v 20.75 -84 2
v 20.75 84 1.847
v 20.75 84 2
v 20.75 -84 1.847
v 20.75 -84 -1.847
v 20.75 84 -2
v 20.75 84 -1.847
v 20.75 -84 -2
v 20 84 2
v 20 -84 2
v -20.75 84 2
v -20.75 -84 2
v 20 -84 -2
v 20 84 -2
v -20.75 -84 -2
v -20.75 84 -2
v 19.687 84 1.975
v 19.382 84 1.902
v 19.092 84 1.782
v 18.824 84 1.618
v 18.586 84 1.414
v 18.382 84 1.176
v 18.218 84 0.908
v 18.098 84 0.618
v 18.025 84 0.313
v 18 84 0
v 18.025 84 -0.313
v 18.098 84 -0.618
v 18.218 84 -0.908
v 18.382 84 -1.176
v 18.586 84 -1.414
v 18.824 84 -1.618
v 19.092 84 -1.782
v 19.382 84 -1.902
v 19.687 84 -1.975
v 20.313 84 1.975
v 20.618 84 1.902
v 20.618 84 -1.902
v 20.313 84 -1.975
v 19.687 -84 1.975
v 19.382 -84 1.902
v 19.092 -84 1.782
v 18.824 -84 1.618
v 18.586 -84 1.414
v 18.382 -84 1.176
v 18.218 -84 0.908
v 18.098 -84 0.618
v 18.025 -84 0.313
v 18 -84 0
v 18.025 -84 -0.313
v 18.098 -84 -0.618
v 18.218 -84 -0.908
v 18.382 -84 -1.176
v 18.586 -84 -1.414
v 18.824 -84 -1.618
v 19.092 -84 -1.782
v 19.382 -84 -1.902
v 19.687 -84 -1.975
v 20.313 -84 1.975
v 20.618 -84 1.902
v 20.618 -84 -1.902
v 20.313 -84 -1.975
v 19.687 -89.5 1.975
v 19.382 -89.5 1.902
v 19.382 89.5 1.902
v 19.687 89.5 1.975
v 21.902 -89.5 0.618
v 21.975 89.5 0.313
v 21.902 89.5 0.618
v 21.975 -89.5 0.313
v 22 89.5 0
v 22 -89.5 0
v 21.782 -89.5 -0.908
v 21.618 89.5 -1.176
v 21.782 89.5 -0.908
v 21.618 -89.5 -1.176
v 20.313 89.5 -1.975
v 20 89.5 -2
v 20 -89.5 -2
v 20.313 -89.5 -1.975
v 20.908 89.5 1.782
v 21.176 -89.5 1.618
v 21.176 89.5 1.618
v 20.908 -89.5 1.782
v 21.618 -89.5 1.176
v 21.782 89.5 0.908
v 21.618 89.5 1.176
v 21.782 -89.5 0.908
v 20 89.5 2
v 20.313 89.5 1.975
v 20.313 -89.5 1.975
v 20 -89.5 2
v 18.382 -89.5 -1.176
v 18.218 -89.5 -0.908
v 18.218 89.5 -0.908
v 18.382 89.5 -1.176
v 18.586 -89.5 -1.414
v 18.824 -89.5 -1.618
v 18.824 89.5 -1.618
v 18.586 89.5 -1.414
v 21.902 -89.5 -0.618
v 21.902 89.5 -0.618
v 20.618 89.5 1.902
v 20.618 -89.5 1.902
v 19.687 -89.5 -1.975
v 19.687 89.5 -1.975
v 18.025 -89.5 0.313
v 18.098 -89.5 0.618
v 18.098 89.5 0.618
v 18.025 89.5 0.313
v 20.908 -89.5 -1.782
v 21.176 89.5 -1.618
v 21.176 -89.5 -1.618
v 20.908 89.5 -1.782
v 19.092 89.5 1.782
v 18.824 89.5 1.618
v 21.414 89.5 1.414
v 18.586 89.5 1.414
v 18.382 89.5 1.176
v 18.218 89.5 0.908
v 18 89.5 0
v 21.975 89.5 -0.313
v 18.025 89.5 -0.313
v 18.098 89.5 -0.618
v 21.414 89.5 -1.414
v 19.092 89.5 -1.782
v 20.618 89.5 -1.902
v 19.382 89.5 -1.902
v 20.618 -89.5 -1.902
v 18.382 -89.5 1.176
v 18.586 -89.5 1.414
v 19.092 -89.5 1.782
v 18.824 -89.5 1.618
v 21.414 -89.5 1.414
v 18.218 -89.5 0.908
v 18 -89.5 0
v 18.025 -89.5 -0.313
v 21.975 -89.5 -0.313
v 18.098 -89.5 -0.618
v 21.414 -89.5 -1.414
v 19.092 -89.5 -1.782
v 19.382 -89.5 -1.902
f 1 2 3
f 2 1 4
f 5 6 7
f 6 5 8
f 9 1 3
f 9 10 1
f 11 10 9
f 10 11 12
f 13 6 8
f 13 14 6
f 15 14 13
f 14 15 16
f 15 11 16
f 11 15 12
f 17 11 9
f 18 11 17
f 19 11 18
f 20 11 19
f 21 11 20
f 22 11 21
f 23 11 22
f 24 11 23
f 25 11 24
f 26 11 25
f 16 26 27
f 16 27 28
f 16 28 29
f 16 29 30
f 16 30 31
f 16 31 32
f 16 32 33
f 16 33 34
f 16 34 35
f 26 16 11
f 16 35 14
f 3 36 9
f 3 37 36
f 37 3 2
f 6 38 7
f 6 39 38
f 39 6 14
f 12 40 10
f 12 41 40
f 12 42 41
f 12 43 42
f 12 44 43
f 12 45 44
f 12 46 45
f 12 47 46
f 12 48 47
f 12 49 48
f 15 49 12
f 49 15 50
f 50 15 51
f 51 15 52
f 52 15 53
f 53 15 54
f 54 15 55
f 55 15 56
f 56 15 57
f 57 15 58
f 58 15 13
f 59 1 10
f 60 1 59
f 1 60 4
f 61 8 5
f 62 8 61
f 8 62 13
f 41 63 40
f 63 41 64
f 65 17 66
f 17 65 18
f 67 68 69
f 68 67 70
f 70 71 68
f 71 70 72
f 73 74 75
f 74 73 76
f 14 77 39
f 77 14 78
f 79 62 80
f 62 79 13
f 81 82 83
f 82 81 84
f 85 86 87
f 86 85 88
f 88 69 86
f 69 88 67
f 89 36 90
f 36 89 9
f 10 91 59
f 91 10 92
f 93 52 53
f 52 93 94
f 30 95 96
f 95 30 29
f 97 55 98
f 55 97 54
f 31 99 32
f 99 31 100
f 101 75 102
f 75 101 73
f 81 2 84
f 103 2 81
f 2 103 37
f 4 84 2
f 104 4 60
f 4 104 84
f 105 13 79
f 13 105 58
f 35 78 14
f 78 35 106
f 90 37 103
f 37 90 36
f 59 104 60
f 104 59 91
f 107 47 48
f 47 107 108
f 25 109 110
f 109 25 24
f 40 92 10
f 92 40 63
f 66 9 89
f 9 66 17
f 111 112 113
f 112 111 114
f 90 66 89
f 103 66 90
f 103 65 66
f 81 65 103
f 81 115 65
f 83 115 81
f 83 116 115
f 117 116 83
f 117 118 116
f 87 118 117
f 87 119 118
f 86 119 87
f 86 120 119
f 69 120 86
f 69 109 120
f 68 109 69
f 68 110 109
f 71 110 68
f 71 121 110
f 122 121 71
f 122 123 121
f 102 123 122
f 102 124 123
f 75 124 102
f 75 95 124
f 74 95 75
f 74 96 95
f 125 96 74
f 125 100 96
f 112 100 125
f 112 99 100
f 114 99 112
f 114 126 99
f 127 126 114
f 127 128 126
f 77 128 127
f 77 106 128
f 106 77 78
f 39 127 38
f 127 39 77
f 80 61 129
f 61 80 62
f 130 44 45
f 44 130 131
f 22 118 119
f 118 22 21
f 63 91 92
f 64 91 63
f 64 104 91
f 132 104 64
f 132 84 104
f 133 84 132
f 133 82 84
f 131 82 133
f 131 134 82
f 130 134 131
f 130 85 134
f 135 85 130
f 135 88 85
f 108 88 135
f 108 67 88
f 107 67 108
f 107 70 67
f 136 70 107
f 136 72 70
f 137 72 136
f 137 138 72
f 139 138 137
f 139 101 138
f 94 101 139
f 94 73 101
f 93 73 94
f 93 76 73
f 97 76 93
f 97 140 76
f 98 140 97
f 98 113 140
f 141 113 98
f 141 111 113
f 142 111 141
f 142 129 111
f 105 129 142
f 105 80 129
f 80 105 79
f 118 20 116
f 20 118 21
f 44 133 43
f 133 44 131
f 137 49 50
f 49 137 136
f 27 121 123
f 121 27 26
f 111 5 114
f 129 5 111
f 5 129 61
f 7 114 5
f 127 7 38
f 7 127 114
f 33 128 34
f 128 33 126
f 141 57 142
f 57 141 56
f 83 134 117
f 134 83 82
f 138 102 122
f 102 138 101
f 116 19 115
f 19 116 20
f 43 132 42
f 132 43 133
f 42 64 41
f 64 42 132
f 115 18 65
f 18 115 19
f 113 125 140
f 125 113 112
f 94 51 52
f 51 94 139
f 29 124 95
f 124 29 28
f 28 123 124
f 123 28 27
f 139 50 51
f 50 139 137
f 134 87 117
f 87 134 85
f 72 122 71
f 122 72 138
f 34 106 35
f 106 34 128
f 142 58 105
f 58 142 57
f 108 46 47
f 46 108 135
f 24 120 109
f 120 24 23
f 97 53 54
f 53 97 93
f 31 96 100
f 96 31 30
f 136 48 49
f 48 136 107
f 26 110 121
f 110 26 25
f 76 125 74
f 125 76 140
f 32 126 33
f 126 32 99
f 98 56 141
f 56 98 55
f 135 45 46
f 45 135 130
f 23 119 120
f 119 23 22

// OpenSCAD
wall_thickness=5;

module ghost_trap_body_half(){
  cube([wall_thickness, 175, 70],center=true);
  
  translate([-45/2,0, -(70 - 5)/2 ])
  cube([45, 175, wall_thickness],center=true);
  
  translate([-45/2,-(175 - 5)/2,0])
  rotate([0,0,90])
  cube([wall_thickness, 45, 70],center=true);
  
  translate([-4, -(175-wall_thickness)/2, 70/2+2.5])
  rotate([90,0,0]){
    difference(){
      union(){
        translate([0,-2.5,0])
        cube([12,wall_thickness,wall_thickness], center=true);
        cylinder(h=wall_thickness, r=6, center=true, $fn=40);
      }
      cylinder(h=wall_thickness, r=3, center=true, $fn=40);
    }
  }
}

module wedge(){
  rotate([90,90,90])
  hull(){
    cylinder(r=1, h=10, $fn=10, center=true);
    translate([0,5,0])cylinder(r=1, h=10, $fn=10, center=true);
    translate([10,0,0])cylinder(r=1, h=10, $fn=10, center=true);
  }
}

module ghost_trap_body(){
    mirror([1,0,0])
    translate([45,0,0])
    ghost_trap_body_half();
  translate([45,0,0])
  ghost_trap_body_half();
  translate([0,-(168)/2,34])
  wedge();
}

module ghost_trap_flap(){
  cube([41.5,168,4], center=true);
  translate([(40)/2, 0,0])
  rotate([90,0,0])
  cylinder(h=179, r=2, center=true, $fn=40);
}

module ghost_trap_end_half(){
  
  translate([29.5,0,0]){
    difference(){
      // beveled edge
      linear_extrude(80, center=true)
      polygon([[0,0], [8,0], [18,10], [18,18], [0,18]]);
      
      translate([11.5,16,32.5])
      rotate([90,0,0])
      cylinder(h=6, r=3, center=true, $fn=40);
    }
    // side
    translate([-12,9,-5])
    cube([35, 18, 70], center=true);
  }
}

module ghost_trap_end_display(){
  w__ = 59;
   hull(){
     translate([0,0,0])cube([w__,2,2], center=true);
     translate([0,-23,17])cube([w__,2,2], center=true);
     translate([0,-23,37])cube([w__,2,2], center=true);
     translate([0,0,25])cube([w__,2,2], center=true);
   }   
}


module ghost_trap_end(){
  ghost_trap_end_half();
  mirror([1,0,0])ghost_trap_end_half();
  translate([0,17,9])ghost_trap_end_display();
}

module caddy_wall(){
  rotate([90,0,0])
  linear_extrude(wall_thickness)
  polygon([
    [0,0],
    [200,0],
    [200,70], 
    [200-75, 70], 
    [200-75-10, 70+10],
    [-10, 70+10],
    [-10,70-(25+10)],
    [0,25]
  ]);
}

module caddy(){
  translate([0,-1,0])
  caddy_wall();
  
  translate([0,97 + wall_thickness,0])
  caddy_wall();
  
  translate([-2,-wall_thickness-1,-wall_thickness])
  cube([202,98+2*wall_thickness,wall_thickness]);
  
  translate([wall_thickness,-wall_thickness,-wall_thickness])
  rotate([0,-90,0])
  cube([70,97+2*wall_thickness,wall_thickness]);
}

module caddy_block(){
  main_width = 86;
  main_depth = 55;
  
  polygon([
    [0,0],
    [main_depth-2*10,0],
    [main_depth-10, 10],
    [main_depth-10, main_width],
    [main_depth-2*10, main_width + 10],
    [0, main_width+10]
  ]);
  
}

module caddy_handle(){
  handle_offset=50;
  handle_length=120;
  grip_diameter=20;
  
  translate([0,0,handle_offset])
  rotate([0,90,0])
  cylinder(h=handle_length, d=grip_diameter);
  
  translate([0,-grip_diameter/2,0])
  cube([grip_diameter, grip_diameter, handle_offset]);
    
}

module caddy_end(){
    linear_extrude(65)
    caddy_block();
    translate([0,48,65])
    caddy_handle();
}


/*
color("blue",0.5)
translate([21,2,37.5])
ghost_trap_flap();

mirror([1,0,0])
translate([21,2,37.5])
ghost_trap_flap();

translate([0,211/2,5])
mirror([0,1,0])
ghost_trap_end();
*/

ghost_trap_flap();

//ghost_trap_body();

//caddy();
//caddy_end();
